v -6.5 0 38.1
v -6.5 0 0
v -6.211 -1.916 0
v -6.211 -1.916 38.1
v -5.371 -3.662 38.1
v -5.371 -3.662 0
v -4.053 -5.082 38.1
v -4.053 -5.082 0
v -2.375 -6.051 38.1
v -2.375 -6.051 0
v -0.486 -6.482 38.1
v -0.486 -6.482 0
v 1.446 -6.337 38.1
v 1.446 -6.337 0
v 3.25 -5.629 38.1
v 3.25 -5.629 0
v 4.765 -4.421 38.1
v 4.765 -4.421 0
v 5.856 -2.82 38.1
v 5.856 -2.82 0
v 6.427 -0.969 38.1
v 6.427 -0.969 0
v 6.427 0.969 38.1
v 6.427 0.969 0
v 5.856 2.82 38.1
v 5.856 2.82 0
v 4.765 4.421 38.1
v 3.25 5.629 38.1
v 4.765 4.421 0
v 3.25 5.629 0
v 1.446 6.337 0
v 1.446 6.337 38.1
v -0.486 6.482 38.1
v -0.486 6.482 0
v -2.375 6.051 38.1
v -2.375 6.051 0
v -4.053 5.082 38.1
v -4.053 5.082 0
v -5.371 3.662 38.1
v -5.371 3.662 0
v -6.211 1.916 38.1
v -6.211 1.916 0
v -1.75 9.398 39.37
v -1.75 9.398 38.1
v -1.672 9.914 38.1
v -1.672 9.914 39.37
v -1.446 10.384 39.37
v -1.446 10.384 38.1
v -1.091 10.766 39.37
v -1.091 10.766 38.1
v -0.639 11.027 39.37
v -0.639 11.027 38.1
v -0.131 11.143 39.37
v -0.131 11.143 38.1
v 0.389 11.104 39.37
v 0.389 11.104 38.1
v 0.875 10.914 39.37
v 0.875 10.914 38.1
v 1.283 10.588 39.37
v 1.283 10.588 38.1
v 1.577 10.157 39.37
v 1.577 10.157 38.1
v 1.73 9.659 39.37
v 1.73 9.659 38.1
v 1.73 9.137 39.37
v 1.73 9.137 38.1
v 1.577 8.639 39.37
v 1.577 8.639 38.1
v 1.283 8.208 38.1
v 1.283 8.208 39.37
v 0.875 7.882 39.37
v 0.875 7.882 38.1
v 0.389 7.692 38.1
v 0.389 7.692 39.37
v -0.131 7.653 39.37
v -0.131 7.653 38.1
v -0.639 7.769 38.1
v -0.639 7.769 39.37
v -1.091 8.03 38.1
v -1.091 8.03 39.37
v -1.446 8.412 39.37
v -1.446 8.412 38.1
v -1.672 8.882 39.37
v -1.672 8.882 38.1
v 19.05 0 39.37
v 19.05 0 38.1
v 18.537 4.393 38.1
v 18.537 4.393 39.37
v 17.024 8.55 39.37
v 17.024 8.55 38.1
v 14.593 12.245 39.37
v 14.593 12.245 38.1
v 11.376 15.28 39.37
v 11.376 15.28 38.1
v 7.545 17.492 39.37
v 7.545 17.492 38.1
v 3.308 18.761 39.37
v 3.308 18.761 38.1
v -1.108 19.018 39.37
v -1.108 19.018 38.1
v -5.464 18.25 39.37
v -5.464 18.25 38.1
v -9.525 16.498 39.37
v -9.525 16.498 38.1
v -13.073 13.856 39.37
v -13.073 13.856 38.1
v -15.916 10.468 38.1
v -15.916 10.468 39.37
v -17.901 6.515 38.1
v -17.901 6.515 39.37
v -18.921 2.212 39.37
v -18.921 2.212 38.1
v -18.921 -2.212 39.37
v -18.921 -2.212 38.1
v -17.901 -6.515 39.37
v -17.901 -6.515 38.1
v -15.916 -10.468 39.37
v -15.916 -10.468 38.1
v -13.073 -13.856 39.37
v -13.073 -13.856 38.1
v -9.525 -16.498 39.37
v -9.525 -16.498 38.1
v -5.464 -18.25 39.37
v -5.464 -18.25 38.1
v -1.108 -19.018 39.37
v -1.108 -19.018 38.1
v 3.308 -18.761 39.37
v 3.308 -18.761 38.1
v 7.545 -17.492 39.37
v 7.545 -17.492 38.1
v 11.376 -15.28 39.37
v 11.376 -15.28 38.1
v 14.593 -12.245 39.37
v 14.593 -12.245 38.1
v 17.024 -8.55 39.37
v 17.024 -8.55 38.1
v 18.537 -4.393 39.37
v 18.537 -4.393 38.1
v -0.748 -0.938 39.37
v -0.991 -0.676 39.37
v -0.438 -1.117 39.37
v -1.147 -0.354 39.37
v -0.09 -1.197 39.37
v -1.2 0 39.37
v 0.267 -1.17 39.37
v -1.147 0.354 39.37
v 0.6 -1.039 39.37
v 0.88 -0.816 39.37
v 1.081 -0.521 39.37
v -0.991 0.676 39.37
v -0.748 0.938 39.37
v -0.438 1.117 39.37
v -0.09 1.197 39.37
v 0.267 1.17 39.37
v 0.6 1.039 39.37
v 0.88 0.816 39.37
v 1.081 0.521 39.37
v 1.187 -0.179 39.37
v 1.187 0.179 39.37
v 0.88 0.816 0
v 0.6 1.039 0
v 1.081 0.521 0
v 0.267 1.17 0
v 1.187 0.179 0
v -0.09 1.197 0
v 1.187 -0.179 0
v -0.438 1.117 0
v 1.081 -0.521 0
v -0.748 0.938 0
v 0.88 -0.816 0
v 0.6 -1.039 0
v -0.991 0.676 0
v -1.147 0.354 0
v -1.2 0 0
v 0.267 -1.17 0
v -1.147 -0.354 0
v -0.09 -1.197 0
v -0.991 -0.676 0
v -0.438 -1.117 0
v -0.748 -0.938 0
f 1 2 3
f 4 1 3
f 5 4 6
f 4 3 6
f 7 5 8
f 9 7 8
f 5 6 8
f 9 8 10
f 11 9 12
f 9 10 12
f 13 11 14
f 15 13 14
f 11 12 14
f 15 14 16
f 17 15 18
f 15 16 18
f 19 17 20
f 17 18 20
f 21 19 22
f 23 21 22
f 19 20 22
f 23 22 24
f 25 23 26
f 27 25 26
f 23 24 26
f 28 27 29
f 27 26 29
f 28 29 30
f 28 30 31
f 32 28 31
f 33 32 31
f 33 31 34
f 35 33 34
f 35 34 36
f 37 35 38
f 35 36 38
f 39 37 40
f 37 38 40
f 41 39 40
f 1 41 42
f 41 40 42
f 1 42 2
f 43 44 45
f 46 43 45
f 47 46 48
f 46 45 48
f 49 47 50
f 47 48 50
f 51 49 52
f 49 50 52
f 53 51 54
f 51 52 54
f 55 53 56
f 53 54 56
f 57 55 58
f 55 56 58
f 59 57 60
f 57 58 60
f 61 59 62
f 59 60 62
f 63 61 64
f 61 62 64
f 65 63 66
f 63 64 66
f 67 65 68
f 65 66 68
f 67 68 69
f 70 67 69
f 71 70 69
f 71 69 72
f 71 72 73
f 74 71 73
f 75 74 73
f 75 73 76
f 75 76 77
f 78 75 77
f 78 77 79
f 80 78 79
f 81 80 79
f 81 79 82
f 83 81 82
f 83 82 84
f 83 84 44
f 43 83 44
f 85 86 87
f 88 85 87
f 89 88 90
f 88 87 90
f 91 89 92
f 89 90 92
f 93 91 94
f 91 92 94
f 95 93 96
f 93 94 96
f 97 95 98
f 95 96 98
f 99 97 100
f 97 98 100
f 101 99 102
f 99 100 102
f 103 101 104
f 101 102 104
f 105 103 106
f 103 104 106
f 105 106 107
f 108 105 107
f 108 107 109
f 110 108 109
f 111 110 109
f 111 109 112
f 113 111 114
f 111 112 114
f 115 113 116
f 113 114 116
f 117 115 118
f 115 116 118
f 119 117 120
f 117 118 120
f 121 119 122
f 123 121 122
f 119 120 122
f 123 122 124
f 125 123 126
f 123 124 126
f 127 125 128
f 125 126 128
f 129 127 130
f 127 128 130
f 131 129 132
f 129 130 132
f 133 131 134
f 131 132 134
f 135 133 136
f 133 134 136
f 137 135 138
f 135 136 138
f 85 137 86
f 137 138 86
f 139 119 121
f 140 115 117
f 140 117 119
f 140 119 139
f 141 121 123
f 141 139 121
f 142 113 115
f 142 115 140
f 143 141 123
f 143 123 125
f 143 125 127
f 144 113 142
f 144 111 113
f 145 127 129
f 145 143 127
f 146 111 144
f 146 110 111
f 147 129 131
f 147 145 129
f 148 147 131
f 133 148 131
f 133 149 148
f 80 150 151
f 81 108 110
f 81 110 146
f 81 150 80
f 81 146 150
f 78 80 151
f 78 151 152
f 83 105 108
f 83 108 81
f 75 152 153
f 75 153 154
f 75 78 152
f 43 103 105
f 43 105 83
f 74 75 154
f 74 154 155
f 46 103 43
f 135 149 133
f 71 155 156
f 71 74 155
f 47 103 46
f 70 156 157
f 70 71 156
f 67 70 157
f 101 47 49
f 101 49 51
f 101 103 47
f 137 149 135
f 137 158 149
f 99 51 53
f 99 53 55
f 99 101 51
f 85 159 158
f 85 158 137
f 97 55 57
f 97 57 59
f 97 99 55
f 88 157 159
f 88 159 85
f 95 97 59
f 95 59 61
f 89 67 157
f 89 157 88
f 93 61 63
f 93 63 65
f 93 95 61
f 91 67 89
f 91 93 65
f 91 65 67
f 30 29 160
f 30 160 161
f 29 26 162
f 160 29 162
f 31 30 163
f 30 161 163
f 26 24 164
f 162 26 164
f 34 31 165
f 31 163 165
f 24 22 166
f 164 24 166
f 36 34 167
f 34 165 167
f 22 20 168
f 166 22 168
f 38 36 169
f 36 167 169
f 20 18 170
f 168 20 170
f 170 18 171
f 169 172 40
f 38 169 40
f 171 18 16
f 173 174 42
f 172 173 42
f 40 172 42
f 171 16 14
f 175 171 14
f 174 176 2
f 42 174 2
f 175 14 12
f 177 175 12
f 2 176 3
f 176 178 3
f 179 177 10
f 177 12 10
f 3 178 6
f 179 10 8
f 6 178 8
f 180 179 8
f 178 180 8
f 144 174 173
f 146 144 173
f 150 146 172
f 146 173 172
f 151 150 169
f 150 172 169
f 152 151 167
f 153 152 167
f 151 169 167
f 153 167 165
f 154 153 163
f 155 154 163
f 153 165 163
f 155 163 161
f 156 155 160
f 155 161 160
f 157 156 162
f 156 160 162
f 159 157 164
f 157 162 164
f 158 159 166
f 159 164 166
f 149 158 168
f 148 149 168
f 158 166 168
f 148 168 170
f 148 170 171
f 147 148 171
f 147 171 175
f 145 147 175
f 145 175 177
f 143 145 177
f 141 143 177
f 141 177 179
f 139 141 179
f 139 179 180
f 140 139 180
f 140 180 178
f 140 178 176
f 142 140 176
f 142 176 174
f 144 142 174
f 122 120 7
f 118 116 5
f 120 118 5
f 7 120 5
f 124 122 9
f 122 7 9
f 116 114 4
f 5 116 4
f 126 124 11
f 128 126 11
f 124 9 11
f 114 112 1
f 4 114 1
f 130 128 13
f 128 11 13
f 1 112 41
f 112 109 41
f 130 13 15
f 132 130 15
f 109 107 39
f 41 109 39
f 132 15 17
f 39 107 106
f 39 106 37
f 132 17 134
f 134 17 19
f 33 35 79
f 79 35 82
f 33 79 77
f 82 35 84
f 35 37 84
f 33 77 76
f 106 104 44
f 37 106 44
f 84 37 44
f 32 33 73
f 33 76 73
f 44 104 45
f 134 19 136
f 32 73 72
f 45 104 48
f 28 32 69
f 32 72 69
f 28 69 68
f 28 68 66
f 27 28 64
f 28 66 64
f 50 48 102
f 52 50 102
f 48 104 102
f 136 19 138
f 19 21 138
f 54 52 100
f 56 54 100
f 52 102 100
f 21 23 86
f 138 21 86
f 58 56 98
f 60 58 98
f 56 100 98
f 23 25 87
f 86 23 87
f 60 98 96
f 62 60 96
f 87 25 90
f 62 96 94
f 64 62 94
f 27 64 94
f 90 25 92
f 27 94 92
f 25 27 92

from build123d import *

# Parameters (mm, degrees)
SKETCH1_R           = 6.5
BOSS_EXTRUDE1_DEPTH = 38.1
SKETCH2_R           = 19.05
BOSS_EXTRUDE2_DEPTH = 1.27
SKETCH3_R           = 1.2
CUT_EXTRUDE1_DEPTH  = 48.705365526
SKETCH4_R           = 1.75
CUT_EXTRUDE2_DEPTH  = 7.62


with BuildPart() as part:
    # Sketch1 → Boss-Extrude1 (new body)
    with BuildSketch(Plane.XY):
        with Locations(Location((0, 0, 0), (0, 0, 180))):
            Circle(SKETCH1_R)
    extrude(amount=BOSS_EXTRUDE1_DEPTH)

    # Sketch2 → Boss-Extrude2 (add)
    with BuildSketch(Plane.XY.offset(38.1)):
        Circle(SKETCH2_R)
    extrude(amount=BOSS_EXTRUDE2_DEPTH)

    # Sketch3 → Cut-Extrude1 (cut, through all)
    with BuildSketch(Plane(origin=(0, 0, 0), x_dir=(-1, 0, 0), z_dir=(0, 0, -1))):
        Circle(SKETCH3_R)
    extrude(amount=-CUT_EXTRUDE1_DEPTH, mode=Mode.SUBTRACT)

    # Sketch4 → Cut-Extrude2 (cut)
    with BuildSketch(Plane(origin=(0, 0, 38.1), x_dir=(-1, 0, 0), z_dir=(0, 0, -1))):
        with Locations((0, 9.398)):
            Circle(SKETCH4_R)
    extrude(amount=-CUT_EXTRUDE2_DEPTH, mode=Mode.SUBTRACT)


solid = part.part
